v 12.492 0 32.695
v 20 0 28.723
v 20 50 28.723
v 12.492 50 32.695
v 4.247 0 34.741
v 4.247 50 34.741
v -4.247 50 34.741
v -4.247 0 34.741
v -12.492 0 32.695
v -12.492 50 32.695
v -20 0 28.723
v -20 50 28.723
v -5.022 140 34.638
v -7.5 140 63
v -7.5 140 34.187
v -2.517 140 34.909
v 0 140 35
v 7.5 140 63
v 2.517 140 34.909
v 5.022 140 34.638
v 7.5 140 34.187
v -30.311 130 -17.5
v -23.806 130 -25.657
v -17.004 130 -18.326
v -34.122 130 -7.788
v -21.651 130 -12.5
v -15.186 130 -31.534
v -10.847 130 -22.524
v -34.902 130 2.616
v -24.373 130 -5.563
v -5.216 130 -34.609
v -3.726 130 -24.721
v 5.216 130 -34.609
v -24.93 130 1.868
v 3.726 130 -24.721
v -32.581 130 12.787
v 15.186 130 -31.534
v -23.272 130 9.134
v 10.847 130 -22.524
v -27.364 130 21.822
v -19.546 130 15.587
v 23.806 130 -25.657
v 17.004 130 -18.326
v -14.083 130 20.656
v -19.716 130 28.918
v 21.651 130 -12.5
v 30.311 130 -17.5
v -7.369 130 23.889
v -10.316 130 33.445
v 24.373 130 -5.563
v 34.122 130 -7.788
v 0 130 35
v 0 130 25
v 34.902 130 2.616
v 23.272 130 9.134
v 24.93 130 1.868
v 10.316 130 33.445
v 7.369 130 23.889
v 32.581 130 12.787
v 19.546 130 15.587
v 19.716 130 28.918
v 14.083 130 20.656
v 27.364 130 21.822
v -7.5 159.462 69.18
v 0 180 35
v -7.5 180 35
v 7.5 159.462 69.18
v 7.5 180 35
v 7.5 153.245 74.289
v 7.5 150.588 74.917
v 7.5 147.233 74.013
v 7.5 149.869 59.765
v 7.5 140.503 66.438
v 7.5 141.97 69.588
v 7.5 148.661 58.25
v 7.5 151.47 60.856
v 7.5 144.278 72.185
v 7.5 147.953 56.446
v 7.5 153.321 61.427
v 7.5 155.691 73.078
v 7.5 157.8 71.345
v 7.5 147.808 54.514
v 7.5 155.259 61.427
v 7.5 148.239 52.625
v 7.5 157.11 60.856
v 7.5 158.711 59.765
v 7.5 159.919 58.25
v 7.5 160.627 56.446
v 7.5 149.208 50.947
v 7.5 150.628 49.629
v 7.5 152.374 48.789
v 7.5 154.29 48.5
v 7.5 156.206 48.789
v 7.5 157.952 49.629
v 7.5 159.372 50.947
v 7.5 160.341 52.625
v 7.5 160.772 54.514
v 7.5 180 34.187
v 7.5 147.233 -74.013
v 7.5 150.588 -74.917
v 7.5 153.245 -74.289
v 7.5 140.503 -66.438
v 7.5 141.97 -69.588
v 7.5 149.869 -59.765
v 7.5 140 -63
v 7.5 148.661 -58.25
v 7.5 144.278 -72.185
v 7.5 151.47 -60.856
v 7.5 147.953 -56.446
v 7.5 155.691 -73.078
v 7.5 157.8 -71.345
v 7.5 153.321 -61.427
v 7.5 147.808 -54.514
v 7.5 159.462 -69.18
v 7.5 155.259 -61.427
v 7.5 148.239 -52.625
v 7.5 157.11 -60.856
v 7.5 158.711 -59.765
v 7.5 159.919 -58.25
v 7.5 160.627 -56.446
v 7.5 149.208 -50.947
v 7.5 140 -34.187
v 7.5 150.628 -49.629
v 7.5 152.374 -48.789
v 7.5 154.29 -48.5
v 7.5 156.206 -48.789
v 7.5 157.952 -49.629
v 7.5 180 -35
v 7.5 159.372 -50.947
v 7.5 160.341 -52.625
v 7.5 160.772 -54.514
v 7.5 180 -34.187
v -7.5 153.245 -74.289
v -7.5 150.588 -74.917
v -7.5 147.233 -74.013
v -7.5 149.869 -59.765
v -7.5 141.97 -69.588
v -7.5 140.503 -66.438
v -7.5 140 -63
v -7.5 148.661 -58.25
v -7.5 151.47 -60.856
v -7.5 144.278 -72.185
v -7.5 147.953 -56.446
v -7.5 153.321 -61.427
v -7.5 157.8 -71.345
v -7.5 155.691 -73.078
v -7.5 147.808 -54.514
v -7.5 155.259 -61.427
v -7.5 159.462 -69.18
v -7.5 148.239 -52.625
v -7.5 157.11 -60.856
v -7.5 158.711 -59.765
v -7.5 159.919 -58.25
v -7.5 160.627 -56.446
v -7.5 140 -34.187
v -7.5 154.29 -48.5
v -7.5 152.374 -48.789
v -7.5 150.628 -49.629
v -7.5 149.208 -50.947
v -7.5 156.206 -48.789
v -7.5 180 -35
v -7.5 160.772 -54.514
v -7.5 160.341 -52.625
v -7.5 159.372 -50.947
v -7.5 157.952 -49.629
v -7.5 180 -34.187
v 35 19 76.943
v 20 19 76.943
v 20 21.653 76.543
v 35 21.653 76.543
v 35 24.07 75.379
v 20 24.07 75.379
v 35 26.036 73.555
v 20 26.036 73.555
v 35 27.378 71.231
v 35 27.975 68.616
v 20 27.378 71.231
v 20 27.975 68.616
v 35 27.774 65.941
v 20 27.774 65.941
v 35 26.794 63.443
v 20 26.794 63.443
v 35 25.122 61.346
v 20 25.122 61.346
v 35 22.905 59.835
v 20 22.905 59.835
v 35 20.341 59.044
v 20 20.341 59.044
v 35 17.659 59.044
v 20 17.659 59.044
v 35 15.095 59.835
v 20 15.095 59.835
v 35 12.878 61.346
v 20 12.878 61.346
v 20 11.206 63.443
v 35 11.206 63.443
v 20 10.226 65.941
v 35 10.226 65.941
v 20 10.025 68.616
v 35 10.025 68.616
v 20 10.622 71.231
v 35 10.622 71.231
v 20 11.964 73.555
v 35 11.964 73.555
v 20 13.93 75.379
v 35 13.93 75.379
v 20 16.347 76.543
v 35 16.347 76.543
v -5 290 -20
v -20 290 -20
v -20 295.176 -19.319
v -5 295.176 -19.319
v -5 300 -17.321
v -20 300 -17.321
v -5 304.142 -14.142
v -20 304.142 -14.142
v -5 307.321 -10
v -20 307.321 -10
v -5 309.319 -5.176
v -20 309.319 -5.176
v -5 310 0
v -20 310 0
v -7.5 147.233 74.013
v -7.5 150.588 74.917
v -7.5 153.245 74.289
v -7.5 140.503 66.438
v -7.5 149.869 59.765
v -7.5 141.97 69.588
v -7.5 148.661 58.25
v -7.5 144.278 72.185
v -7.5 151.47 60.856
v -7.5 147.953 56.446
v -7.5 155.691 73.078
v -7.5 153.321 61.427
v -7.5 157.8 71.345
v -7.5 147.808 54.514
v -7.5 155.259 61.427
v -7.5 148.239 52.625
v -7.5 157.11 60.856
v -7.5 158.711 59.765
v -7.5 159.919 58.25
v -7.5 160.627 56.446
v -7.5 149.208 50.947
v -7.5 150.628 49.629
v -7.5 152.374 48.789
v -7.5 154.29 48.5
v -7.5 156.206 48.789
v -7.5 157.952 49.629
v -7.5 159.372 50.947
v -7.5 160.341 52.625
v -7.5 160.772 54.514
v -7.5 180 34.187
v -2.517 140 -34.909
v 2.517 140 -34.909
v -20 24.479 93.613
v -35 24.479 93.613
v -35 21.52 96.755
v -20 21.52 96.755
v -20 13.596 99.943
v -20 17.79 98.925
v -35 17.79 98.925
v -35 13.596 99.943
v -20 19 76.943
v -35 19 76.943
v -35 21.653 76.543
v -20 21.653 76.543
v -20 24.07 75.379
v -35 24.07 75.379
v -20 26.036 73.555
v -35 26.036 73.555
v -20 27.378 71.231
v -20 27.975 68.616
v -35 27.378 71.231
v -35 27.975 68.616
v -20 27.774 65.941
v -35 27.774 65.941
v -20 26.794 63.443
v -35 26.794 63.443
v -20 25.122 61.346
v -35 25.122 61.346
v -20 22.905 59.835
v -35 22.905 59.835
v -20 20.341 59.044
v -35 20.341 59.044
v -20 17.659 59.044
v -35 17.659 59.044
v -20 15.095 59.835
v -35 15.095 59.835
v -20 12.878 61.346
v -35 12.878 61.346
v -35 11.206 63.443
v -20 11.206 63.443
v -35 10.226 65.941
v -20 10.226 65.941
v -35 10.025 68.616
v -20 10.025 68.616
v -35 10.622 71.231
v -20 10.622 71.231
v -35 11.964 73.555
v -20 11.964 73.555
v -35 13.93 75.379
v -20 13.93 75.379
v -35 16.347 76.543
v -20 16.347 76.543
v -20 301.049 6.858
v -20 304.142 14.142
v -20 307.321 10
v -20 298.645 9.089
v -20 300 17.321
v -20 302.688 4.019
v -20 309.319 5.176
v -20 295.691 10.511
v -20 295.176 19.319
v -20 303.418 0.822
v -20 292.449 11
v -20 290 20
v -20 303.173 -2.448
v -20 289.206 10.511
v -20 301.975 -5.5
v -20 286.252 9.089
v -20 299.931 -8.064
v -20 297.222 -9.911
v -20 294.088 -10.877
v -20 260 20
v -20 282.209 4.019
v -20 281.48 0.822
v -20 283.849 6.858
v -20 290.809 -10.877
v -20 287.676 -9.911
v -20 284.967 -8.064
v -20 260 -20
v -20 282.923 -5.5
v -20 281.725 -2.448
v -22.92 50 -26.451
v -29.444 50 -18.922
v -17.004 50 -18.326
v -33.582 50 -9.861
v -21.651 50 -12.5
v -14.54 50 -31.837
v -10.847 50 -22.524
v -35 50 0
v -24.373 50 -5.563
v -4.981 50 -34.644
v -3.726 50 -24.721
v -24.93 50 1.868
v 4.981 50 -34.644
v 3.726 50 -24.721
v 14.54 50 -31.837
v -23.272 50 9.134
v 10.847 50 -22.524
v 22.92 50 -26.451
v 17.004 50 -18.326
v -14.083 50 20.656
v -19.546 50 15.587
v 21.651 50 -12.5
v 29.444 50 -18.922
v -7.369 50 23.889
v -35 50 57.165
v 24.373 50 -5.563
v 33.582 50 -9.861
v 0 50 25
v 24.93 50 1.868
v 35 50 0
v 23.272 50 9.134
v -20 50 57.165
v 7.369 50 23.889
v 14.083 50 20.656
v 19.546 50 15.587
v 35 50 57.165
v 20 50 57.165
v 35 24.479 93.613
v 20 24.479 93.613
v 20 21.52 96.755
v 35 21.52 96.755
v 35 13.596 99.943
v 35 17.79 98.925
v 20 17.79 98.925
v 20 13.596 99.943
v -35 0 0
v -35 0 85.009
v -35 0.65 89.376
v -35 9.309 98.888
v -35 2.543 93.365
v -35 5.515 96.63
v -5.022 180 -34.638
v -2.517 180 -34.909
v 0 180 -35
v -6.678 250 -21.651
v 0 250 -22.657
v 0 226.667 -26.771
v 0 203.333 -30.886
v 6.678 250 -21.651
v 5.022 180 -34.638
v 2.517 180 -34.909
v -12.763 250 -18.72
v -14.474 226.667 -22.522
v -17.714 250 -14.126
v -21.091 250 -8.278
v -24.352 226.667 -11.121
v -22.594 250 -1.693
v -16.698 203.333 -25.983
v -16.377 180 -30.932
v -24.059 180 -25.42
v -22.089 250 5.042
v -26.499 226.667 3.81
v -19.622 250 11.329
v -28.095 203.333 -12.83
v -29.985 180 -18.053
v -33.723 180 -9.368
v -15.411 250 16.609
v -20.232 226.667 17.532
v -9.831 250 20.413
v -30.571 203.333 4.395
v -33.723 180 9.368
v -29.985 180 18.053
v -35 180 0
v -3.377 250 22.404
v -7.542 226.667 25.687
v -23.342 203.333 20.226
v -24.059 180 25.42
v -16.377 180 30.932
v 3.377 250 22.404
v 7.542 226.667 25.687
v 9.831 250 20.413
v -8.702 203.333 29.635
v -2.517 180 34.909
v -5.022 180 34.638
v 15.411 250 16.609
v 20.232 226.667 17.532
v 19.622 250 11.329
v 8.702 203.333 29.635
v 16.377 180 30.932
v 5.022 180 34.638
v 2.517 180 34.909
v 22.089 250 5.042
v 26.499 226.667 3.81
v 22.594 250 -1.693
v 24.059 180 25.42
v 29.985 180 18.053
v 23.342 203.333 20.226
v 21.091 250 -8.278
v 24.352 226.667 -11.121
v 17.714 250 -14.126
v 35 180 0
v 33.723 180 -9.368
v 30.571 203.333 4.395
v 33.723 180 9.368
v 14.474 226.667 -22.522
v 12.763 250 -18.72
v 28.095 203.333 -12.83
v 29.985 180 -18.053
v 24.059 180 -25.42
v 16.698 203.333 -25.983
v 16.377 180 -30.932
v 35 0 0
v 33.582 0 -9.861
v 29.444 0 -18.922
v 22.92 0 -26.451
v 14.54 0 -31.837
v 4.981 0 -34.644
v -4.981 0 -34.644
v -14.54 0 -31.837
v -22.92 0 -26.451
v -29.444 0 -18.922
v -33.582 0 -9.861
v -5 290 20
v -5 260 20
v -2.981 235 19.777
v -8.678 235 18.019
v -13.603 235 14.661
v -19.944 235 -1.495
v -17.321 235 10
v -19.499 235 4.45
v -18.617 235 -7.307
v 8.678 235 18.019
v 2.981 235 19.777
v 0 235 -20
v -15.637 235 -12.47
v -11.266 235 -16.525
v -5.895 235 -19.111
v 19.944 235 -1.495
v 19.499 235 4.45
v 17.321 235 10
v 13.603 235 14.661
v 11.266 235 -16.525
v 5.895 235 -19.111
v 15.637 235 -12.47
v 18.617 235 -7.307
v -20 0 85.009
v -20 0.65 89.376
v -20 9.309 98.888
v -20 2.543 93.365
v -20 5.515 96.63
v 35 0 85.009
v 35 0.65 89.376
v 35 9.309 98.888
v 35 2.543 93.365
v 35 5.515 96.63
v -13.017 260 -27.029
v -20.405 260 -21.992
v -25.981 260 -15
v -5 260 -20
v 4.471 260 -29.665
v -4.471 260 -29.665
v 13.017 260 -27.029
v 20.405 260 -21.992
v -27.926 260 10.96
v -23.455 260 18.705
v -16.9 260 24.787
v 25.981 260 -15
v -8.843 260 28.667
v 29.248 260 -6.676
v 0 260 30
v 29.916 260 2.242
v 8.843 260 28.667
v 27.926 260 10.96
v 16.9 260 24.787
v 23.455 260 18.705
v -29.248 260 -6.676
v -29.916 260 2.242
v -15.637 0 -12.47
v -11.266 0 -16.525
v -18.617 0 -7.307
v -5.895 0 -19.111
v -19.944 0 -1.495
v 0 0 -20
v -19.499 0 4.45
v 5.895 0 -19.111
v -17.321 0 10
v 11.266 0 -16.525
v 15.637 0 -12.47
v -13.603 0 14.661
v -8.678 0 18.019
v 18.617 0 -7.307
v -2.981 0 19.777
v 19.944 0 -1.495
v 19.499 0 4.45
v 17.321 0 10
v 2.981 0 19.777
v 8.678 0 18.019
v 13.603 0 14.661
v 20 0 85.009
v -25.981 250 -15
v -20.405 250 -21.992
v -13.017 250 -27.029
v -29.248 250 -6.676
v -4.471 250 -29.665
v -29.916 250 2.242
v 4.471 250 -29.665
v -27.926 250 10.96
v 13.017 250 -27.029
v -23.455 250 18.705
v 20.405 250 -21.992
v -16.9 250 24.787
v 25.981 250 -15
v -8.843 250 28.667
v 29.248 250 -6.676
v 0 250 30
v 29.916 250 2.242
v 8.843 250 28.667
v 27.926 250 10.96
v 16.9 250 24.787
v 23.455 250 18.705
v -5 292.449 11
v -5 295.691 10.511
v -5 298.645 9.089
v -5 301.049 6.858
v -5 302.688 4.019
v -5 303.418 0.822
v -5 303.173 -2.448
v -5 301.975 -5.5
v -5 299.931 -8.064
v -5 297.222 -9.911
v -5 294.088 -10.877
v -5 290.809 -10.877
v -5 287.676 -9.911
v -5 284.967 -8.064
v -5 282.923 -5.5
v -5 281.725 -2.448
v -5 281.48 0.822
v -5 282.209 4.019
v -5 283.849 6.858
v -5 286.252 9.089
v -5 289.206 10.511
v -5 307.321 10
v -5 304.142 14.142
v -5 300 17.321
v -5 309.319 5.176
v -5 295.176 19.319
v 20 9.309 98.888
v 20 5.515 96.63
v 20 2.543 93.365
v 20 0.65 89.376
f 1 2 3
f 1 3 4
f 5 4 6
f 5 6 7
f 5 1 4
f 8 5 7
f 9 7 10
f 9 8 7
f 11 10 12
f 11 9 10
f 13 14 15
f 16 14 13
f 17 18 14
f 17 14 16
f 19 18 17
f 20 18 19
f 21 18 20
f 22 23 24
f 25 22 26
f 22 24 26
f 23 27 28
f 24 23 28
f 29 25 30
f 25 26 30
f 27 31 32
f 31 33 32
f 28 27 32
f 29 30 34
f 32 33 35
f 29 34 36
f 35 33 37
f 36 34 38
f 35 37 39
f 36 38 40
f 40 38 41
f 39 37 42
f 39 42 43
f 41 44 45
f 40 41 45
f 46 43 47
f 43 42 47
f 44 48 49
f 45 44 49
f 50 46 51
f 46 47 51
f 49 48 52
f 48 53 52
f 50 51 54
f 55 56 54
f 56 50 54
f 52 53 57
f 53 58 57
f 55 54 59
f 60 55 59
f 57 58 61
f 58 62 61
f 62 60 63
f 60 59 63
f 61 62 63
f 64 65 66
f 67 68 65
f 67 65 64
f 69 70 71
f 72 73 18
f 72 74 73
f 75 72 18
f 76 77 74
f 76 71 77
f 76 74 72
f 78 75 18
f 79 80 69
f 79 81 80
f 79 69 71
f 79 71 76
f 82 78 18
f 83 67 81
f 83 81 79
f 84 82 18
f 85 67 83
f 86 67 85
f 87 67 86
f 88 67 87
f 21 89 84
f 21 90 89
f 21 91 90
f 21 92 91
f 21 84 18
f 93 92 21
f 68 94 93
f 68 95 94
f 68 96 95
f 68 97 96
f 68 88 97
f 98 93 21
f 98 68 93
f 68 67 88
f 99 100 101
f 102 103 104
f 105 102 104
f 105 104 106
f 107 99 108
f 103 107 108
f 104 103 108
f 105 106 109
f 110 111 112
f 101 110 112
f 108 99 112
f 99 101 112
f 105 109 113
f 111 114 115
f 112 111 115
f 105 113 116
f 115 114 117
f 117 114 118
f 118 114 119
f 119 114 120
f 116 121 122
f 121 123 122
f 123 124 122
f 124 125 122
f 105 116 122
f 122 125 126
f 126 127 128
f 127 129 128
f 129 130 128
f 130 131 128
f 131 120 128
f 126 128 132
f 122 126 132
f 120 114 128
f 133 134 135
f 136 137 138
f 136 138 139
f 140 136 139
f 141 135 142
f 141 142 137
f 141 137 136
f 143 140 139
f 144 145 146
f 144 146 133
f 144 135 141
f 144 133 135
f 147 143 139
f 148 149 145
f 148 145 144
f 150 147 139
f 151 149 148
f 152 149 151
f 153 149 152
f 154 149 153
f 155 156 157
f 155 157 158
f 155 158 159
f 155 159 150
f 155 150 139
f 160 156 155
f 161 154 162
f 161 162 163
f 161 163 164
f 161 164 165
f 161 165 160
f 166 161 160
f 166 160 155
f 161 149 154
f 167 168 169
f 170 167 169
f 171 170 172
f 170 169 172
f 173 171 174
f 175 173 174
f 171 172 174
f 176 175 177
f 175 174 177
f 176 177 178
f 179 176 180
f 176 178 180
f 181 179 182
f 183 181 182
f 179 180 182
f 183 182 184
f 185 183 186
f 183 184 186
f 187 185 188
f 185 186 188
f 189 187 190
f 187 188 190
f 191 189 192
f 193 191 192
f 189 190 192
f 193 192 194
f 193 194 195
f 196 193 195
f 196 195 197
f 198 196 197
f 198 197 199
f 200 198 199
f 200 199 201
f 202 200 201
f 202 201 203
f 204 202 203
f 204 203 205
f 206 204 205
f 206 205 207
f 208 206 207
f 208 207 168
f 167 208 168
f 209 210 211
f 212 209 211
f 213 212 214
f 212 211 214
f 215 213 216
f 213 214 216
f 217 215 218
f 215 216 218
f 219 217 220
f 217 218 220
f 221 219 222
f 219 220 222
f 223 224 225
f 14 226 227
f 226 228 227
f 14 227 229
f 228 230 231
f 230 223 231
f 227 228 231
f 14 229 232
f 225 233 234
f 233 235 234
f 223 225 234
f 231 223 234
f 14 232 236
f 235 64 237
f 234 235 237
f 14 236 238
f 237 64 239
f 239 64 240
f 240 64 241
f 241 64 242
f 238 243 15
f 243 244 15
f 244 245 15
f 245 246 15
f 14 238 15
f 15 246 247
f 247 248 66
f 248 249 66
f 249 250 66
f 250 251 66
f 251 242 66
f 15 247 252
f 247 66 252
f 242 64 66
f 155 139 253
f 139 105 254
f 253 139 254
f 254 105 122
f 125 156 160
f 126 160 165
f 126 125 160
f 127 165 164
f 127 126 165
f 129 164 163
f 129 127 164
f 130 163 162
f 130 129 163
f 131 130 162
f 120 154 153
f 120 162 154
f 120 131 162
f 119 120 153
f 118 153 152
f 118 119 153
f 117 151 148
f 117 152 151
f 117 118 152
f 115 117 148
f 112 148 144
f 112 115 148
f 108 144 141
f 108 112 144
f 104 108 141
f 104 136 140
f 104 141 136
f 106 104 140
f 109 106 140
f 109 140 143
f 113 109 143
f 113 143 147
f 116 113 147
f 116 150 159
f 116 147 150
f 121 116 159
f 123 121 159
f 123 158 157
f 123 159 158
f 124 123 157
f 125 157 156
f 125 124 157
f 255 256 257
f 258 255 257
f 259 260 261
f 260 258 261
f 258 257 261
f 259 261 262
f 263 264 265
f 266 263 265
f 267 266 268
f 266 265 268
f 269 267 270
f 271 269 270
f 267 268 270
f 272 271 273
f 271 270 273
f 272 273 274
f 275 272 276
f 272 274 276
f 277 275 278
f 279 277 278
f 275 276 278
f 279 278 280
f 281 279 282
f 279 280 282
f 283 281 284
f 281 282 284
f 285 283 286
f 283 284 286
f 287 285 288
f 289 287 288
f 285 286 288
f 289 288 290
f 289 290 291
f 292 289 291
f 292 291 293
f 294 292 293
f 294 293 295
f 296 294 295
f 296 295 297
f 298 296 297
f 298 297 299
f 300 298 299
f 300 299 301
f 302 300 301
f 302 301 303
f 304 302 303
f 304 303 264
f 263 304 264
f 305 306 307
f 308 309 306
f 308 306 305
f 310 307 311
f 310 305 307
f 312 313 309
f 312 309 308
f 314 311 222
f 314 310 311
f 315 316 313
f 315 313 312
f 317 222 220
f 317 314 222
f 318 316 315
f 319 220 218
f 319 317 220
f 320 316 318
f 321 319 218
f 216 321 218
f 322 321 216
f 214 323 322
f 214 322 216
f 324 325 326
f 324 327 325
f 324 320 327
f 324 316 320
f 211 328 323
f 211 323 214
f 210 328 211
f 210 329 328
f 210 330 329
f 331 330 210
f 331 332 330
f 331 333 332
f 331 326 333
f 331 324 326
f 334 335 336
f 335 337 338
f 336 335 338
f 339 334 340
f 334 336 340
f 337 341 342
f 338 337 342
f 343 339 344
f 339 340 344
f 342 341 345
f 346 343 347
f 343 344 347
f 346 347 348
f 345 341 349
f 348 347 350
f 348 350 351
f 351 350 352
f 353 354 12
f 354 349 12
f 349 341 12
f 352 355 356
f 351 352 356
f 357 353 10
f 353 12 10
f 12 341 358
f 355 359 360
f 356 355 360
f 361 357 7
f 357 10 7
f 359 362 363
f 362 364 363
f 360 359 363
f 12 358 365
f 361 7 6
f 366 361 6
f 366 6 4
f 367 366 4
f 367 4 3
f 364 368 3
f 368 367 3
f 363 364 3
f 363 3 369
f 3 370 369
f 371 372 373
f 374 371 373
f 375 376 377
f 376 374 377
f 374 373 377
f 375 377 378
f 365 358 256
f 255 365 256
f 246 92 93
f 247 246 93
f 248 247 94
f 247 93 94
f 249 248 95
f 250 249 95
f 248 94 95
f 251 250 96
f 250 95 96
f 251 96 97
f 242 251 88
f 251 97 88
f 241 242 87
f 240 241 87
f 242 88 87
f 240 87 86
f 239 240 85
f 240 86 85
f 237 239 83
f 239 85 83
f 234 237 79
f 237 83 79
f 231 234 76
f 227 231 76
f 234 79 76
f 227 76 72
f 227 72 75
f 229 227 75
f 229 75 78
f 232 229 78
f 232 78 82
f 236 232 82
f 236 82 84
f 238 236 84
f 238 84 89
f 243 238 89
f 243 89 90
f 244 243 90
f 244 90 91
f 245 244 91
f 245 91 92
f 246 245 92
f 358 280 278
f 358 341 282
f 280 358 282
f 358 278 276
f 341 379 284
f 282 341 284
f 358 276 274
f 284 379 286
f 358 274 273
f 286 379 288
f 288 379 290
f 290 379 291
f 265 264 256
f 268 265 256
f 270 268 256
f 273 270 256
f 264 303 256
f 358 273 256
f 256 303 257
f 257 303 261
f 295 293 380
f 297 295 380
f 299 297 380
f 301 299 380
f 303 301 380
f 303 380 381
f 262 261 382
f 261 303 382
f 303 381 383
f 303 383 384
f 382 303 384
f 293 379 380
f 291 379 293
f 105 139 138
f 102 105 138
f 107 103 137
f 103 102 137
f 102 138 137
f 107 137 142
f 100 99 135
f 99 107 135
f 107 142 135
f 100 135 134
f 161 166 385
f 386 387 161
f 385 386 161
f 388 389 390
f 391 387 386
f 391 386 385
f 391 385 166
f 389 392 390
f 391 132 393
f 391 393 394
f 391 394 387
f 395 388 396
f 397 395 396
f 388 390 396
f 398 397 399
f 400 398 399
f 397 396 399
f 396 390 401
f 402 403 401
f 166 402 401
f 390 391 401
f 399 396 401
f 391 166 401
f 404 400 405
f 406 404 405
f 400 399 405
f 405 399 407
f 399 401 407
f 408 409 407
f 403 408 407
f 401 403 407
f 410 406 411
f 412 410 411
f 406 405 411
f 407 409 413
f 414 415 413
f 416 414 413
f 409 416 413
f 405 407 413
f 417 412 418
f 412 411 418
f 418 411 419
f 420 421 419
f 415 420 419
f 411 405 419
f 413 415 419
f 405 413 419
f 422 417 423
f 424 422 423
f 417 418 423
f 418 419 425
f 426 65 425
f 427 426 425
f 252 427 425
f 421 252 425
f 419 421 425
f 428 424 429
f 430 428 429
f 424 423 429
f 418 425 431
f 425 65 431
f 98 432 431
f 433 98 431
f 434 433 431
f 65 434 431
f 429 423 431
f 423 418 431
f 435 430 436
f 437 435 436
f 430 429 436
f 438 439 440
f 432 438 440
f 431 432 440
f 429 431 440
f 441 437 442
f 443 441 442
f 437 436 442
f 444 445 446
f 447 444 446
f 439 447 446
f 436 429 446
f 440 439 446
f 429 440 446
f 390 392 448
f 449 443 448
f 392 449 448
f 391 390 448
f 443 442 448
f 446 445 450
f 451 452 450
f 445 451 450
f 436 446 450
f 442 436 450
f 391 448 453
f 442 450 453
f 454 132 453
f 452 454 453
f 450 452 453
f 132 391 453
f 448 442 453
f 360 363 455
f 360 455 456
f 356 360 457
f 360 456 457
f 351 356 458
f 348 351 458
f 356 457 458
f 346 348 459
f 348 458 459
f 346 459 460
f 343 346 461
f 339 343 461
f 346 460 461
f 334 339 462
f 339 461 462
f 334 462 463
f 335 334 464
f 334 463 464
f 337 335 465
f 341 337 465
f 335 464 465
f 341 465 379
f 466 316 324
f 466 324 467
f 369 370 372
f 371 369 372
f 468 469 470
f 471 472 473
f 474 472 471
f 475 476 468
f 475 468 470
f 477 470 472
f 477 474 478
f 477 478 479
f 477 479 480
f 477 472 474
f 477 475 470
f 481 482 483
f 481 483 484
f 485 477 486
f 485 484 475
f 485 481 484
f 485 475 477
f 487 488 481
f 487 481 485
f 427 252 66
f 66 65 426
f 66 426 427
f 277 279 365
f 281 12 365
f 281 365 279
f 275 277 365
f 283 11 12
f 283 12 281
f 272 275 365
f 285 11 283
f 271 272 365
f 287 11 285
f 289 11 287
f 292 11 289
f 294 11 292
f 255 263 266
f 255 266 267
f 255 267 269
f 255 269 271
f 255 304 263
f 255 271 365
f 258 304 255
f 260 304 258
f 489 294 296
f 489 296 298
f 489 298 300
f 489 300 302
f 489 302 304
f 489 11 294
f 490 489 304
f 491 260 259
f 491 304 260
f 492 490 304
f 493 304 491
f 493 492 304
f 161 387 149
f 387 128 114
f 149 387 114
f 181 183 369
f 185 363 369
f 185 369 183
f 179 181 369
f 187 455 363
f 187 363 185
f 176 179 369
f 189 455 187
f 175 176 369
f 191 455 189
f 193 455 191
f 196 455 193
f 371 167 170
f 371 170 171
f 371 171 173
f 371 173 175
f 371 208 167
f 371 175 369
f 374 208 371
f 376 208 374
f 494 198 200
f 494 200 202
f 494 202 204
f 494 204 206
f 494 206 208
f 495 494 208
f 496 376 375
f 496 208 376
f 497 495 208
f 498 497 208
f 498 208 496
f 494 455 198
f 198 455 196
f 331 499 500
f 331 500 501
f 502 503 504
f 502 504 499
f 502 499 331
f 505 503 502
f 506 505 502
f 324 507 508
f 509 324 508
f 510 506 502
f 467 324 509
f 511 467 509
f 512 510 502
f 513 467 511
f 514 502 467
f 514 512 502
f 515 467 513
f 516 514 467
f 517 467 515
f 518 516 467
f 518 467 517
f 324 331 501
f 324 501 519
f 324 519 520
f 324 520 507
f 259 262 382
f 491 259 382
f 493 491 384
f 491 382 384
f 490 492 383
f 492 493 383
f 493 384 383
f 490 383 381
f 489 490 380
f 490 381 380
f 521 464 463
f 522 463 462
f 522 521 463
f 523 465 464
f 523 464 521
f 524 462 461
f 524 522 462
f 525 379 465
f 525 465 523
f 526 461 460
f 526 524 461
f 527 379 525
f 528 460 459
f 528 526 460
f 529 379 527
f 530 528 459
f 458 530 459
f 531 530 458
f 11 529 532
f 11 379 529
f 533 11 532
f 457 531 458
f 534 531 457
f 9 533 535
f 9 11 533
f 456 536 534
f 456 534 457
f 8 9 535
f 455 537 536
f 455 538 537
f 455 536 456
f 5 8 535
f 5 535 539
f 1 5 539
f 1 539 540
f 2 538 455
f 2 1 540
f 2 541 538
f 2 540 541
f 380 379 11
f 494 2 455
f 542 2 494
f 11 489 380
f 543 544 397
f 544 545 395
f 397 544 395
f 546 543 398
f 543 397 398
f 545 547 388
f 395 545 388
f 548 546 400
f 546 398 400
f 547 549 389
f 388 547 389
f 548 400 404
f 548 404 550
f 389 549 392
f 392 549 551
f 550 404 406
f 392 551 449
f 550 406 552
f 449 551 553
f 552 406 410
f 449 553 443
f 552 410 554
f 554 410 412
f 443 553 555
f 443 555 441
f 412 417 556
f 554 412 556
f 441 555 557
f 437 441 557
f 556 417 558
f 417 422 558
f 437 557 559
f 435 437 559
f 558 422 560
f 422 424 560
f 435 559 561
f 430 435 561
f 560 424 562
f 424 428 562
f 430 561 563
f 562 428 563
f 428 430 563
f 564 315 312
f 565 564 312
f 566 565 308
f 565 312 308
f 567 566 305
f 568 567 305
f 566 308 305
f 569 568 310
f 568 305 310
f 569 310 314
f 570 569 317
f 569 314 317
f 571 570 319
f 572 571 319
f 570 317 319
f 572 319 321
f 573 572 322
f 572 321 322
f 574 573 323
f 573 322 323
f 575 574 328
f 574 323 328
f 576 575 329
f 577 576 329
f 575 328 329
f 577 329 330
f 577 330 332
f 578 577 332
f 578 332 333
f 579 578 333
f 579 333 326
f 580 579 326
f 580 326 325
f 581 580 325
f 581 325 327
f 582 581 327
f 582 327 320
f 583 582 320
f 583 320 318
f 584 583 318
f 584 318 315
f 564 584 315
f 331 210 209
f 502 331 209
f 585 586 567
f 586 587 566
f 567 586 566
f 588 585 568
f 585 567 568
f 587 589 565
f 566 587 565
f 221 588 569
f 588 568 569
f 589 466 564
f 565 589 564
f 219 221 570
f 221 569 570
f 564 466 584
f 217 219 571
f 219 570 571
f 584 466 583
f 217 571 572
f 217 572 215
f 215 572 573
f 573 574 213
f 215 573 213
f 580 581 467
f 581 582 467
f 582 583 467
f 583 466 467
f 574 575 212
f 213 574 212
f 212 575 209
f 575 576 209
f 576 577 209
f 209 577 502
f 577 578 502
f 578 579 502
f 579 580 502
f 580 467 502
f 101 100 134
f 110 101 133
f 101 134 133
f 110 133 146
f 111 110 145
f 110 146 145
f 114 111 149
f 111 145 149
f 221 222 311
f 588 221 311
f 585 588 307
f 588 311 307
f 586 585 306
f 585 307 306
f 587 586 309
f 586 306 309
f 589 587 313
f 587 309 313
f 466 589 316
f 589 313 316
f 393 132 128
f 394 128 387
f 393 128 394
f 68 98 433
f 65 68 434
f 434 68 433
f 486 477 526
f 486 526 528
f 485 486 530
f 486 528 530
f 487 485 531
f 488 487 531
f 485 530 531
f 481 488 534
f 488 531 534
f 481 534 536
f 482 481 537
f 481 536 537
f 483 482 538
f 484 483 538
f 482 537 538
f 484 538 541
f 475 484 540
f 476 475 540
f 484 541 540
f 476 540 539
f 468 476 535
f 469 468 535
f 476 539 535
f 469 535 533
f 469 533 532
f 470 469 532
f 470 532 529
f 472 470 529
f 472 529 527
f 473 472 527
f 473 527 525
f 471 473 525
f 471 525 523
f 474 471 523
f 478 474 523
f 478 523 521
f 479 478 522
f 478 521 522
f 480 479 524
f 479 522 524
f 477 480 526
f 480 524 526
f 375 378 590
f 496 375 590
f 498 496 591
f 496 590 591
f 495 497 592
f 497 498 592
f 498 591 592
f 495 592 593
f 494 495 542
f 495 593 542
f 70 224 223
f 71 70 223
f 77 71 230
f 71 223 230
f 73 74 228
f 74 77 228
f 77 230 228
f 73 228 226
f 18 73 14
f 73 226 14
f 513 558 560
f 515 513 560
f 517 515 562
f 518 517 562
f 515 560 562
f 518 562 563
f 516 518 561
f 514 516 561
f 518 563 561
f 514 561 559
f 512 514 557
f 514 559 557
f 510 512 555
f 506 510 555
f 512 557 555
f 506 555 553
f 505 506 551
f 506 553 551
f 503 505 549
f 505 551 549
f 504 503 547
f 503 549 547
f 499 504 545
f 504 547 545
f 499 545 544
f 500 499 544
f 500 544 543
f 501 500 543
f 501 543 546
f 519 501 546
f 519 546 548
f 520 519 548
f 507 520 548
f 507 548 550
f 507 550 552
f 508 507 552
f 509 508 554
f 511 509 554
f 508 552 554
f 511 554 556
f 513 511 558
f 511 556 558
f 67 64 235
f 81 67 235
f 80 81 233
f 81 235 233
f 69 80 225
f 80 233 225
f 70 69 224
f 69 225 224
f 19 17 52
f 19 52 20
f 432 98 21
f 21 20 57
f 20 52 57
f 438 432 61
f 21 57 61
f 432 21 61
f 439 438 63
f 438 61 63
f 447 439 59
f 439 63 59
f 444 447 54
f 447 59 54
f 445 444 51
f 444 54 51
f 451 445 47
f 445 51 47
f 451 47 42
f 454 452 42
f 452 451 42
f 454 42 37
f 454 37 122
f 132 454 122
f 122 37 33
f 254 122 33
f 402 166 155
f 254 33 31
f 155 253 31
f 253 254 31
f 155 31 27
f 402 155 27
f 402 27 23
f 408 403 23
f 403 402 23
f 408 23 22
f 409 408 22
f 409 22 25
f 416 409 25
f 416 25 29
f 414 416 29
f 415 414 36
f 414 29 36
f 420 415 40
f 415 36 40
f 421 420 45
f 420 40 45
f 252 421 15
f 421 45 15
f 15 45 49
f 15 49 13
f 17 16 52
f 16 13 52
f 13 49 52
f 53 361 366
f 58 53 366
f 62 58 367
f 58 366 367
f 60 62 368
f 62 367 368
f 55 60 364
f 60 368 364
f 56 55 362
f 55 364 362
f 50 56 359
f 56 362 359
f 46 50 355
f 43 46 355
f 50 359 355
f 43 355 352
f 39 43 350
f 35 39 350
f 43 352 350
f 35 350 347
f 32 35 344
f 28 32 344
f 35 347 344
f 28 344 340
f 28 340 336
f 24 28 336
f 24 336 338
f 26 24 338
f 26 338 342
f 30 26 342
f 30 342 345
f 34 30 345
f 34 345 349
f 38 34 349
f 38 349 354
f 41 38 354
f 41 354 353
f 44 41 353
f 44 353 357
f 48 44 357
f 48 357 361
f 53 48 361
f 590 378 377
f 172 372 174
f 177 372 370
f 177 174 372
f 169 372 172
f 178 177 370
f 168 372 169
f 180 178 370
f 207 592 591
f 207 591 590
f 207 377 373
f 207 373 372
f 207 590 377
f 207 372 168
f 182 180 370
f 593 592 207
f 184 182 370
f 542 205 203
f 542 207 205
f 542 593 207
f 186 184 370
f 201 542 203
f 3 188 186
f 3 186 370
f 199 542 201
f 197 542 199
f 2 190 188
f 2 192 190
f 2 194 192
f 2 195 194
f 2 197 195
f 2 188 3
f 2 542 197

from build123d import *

# Parameters (mm, degrees)
SKETCH1_R           = 35
BOSS_EXTRUDE1_DEPTH = 50
SKETCH6_R           = 25
BOSS_EXTRUDE2_DEPTH = 80
SKETCH7_R           = 35
BOSS_EXTRUDE3_DEPTH = 50
SKETCH10_R          = 30
BOSS_EXTRUDE5_DEPTH = 10
SKETCH12_W          = 70
SKETCH12_H          = 100.009163948
BOSS_EXTRUDE6_DEPTH = 50
CUT_EXTRUDE1_DEPTH  = 288.231322933
CUT_EXTRUDE2_DEPTH  = 281.761166962
FILLET1_R           = 15
SKETCH15_R          = 9
CUT_EXTRUDE3_DEPTH  = 288.208392811
BOSS_EXTRUDE8_DEPTH = 7.5
FILLET2_R           = 12
SKETCH17_R          = 6.5
CUT_EXTRUDE4_DEPTH  = 282.771025659
FILLET3_R           = 12
SKETCH18_W          = 15
SKETCH18_H          = 40
BOSS_EXTRUDE9_DEPTH = 50
CUT_EXTRUDE5_DEPTH  = 331.323570005
SKETCH20_R          = 11
CUT_EXTRUDE6_DEPTH  = 331.323570005
SKETCH21_R          = 20
CUT_EXTRUDE7_DEPTH  = 235


with BuildPart() as part:
    # Sketch1 → Boss-Extrude1 (new body)
    with BuildSketch(Plane(origin=(0, 0, 0), x_dir=(1, 0, 0), z_dir=(0, 1, 0))):
        with Locations(Location((0, 0, 0), (0, 0, 270))):
            Circle(SKETCH1_R)
    extrude(amount=BOSS_EXTRUDE1_DEPTH)

    # Sketch6 → Boss-Extrude2 (add)
    with BuildSketch(Plane(origin=(0, 50, 0), x_dir=(1, 0, 0), z_dir=(0, 1, 0))):
        with Locations(Location((0, 0, 0), (0, 0, 270))):
            Circle(SKETCH6_R)
    extrude(amount=BOSS_EXTRUDE2_DEPTH)

    # Sketch7 → Boss-Extrude3 (add)
    with BuildSketch(Plane(origin=(0, 130, 0), x_dir=(1, 0, 0), z_dir=(0, 1, 0))):
        with Locations(Location((0, 0, 0), (0, 0, 270))):
            Circle(SKETCH7_R)
    extrude(amount=BOSS_EXTRUDE3_DEPTH)



with BuildPart() as body_2:
    # Sketch10 → Boss-Extrude5 (new body)
    with BuildSketch(Plane(origin=(0, 250, 0), x_dir=(1, 0, 0), z_dir=(0, 1, 0))):
        with Locations(Location((0, 0, 0), (0, 0, 270))):
            Circle(SKETCH10_R)
    extrude(amount=BOSS_EXTRUDE5_DEPTH)


with BuildPart() as part_1:
    add(part.part)

    add(body_2.part)  # Revolve1 merges body 2
    # Sketch11 → Revolve1 (revolve)
    with BuildSketch(Plane(origin=(0, 0, 0), x_dir=(0, 0, -1), z_dir=(1, 0, 0))):
        Polygon((0, 250), (22.65711135, 250), (35, 180), (0, 180), align=None)
    revolve(axis=Axis((0, 180, 0), (0, 1, 0)))

    # Sketch12 → Boss-Extrude6 (add)
    with BuildSketch(Plane.XZ):
        with Locations((0, 50.004581974)):
            Rectangle(SKETCH12_W, SKETCH12_H)
    extrude(amount=-BOSS_EXTRUDE6_DEPTH)

    # Sketch13 → Cut-Extrude1 (cut, through all)
    with BuildSketch(Plane.ZY.offset(35)):
        Polygon((57.164723746, 50), (100.009163948, 20), (100.009163948, 50), align=None)
    extrude(amount=-CUT_EXTRUDE1_DEPTH, mode=Mode.SUBTRACT)

    # Sketch14 → Cut-Extrude2 (cut, through all)
    with BuildSketch(Plane.XZ):
        with BuildLine():
            Line((-20, 108.740570097), (20, 108.740570097))
            Line((20, 108.740570097), (20, 28.722813233))
            ThreePointArc((20, 28.722813233), (0, 35), (-20, 28.722813233))
            Line((-20, 28.722813233), (-20, 108.740570097))
        make_face()
    extrude(amount=-CUT_EXTRUDE2_DEPTH, mode=Mode.SUBTRACT)

    # Fillet1
    # the kernel refuses this fillet: 15 mm, written as the material it takes off along each edge
    with BuildSketch(Plane(origin=(-17.5, 0, 100.009163948), x_dir=(0, 0, -1), z_dir=(1, 0, 0)), Plane(origin=(-72.5, 0, 100.009163948), x_dir=(0, 0, -1), z_dir=(1, 0, 0))) as fillet1_piece_1:
        with BuildLine():
            CenterArc((FILLET1_R, FILLET1_R), FILLET1_R, 180, 90)
            Line((0, FILLET1_R), (0, 0))
            Line((0, 0), (FILLET1_R, 0))
        make_face()
    extrude(amount=90, mode=Mode.SUBTRACT)
    with BuildSketch(Plane(origin=(0.478735604, 20, 100.009163948), x_dir=(0, -1, 0), z_dir=(1, 0, 0)), Plane(origin=(-54.521264396, 20, 100.009163948), x_dir=(0, -1, 0), z_dir=(1, 0, 0))) as fillet1_piece_2:
        with BuildLine():
            CenterArc((FILLET1_R * 0.520567050552, FILLET1_R), FILLET1_R, 215, 55)
            Line((-FILLET1_R * 0.298584993737, FILLET1_R * 0.426423563649), (0, 0))
            Line((0, 0), (FILLET1_R * 0.520567050552, 0))
        make_face()
    extrude(amount=54.042528791, mode=Mode.SUBTRACT)

    # Sketch15 → Cut-Extrude3 (cut, through all)
    with BuildSketch(Plane.ZY.offset(35)):
        with Locations((67.943288424, 19)):
            Circle(SKETCH15_R)
    extrude(amount=-CUT_EXTRUDE3_DEPTH, mode=Mode.SUBTRACT)

    # Sketch16 → Boss-Extrude8 (add, symmetric)
    with BuildSketch(Plane(origin=(0, 0, 0), x_dir=(0, 0, -1), z_dir=(1, 0, 0))):
        Polygon((-35, 180), (-75, 155.965575239), (-75, 140), (-35, 140), (0, 140), (0, 180), align=None)
    boss_extrude8 = extrude(amount=BOSS_EXTRUDE8_DEPTH, both=True)

    # Fillet2
    # the kernel refuses this fillet: 12 mm, written as the material it takes off along each edge
    with BuildSketch(Plane(origin=(-37.5, 140, 75), x_dir=(0, 0, -1), z_dir=(1, 0, 0))) as fillet2_piece_1:
        with BuildLine():
            CenterArc((FILLET2_R, FILLET2_R), FILLET2_R, 180, 90)
            Line((0, FILLET2_R), (0, 0))
            Line((0, 0), (FILLET2_R, 0))
        make_face()
    extrude(amount=75, mode=Mode.SUBTRACT)
    with BuildSketch(Plane(origin=(-24.473183346, 155.965575239, 75), x_dir=(0, 0.5150380749100483, -0.8571673007021159), z_dir=(1, 0, 0))) as fillet2_piece_2:
        with BuildLine():
            CenterArc((FILLET2_R * 0.565772778188, -FILLET2_R), FILLET2_R, 90, 59)
            Line((-FILLET2_R * 0.291394522514, -FILLET2_R * 0.48496192509), (0, 0))
            Line((0, 0), (FILLET2_R * 0.565772778188, 0))
        make_face()
    extrude(amount=48.946366691, mode=Mode.SUBTRACT)

    # Sketch17 → Cut-Extrude4 (cut, through all)
    with BuildSketch(Plane(origin=(7.5, 0, 0), x_dir=(0, 0, -1), z_dir=(1, 0, 0))):
        with Locations((-55, 154.29)):
            Circle(SKETCH17_R)
    cut_extrude4 = extrude(amount=-CUT_EXTRUDE4_DEPTH, mode=Mode.SUBTRACT)

    # Mirror1: Boss-Extrude8 across plane
    add(boss_extrude8.mirror(Plane.XY))

    # Fillet3
    # the kernel refuses this fillet: 12 mm, written as the material it takes off along each edge
    with BuildSketch(Plane(origin=(-37.5, 140, -75), x_dir=(0, 0, 1), z_dir=(1, 0, 0))) as fillet3_piece_1:
        with BuildLine():
            CenterArc((FILLET3_R, -FILLET3_R), FILLET3_R, 90, 90)
            Line((0, -FILLET3_R), (0, 0))
            Line((0, 0), (FILLET3_R, 0))
        make_face()
    extrude(amount=75, mode=Mode.SUBTRACT)
    with BuildSketch(Plane(origin=(-24.473183346, 155.965575239, -75), x_dir=(0, 0.5150380749100483, 0.8571673007021159), z_dir=(1, 0, 0))) as fillet3_piece_2:
        with BuildLine():
            CenterArc((FILLET3_R * 0.565772778188, FILLET3_R), FILLET3_R, 211, 59)
            Line((-FILLET3_R * 0.291394522514, FILLET3_R * 0.48496192509), (0, 0))
            Line((0, 0), (FILLET3_R * 0.565772778188, 0))
        make_face()
    extrude(amount=48.946366691, mode=Mode.SUBTRACT)

    # Mirror2: Cut-Extrude4 across plane
    add(cut_extrude4.mirror(Plane.XY), mode=Mode.SUBTRACT)

    # Sketch18 → Boss-Extrude9 (add)
    with BuildSketch(Plane(origin=(0, 260, 0), x_dir=(1, 0, 0), z_dir=(0, 1, 0))):
        with Locations((-12.5, 0)):
            Rectangle(SKETCH18_W, SKETCH18_H)
    extrude(amount=BOSS_EXTRUDE9_DEPTH)

    # Sketch19 → Cut-Extrude5 (cut, through all)
    with BuildSketch(Plane.ZY.offset(20)):
        with BuildLine():
            Line((20, 310), (-1.45e-07, 310))
            ThreePointArc((-1.45e-07, 310), (14.142135572, 304.142135675), (20, 290))
            Line((20, 290), (20, 310))
        make_face()
        with BuildLine():
            Line((-20, 310), (-20, 290))
            ThreePointArc((-20, 290), (-14.142135675, 304.142135572), (-1.45e-07, 310))
            Line((-1.45e-07, 310), (-20, 310))
        make_face()
    extrude(amount=-CUT_EXTRUDE5_DEPTH, mode=Mode.SUBTRACT)

    # Sketch20 → Cut-Extrude6 (cut, through all)
    with BuildSketch(Plane.ZY.offset(20)):
        with Locations((0, 292.448780647)):
            Circle(SKETCH20_R)
    extrude(amount=-CUT_EXTRUDE6_DEPTH, mode=Mode.SUBTRACT)

    # Sketch21 → Cut-Extrude7 (cut)
    with BuildSketch(Plane.XZ):
        with Locations(Location((0, 0, 0), (0, 0, 270))):
            Circle(SKETCH21_R)
    extrude(amount=-CUT_EXTRUDE7_DEPTH, mode=Mode.SUBTRACT)


solid = part_1.part
